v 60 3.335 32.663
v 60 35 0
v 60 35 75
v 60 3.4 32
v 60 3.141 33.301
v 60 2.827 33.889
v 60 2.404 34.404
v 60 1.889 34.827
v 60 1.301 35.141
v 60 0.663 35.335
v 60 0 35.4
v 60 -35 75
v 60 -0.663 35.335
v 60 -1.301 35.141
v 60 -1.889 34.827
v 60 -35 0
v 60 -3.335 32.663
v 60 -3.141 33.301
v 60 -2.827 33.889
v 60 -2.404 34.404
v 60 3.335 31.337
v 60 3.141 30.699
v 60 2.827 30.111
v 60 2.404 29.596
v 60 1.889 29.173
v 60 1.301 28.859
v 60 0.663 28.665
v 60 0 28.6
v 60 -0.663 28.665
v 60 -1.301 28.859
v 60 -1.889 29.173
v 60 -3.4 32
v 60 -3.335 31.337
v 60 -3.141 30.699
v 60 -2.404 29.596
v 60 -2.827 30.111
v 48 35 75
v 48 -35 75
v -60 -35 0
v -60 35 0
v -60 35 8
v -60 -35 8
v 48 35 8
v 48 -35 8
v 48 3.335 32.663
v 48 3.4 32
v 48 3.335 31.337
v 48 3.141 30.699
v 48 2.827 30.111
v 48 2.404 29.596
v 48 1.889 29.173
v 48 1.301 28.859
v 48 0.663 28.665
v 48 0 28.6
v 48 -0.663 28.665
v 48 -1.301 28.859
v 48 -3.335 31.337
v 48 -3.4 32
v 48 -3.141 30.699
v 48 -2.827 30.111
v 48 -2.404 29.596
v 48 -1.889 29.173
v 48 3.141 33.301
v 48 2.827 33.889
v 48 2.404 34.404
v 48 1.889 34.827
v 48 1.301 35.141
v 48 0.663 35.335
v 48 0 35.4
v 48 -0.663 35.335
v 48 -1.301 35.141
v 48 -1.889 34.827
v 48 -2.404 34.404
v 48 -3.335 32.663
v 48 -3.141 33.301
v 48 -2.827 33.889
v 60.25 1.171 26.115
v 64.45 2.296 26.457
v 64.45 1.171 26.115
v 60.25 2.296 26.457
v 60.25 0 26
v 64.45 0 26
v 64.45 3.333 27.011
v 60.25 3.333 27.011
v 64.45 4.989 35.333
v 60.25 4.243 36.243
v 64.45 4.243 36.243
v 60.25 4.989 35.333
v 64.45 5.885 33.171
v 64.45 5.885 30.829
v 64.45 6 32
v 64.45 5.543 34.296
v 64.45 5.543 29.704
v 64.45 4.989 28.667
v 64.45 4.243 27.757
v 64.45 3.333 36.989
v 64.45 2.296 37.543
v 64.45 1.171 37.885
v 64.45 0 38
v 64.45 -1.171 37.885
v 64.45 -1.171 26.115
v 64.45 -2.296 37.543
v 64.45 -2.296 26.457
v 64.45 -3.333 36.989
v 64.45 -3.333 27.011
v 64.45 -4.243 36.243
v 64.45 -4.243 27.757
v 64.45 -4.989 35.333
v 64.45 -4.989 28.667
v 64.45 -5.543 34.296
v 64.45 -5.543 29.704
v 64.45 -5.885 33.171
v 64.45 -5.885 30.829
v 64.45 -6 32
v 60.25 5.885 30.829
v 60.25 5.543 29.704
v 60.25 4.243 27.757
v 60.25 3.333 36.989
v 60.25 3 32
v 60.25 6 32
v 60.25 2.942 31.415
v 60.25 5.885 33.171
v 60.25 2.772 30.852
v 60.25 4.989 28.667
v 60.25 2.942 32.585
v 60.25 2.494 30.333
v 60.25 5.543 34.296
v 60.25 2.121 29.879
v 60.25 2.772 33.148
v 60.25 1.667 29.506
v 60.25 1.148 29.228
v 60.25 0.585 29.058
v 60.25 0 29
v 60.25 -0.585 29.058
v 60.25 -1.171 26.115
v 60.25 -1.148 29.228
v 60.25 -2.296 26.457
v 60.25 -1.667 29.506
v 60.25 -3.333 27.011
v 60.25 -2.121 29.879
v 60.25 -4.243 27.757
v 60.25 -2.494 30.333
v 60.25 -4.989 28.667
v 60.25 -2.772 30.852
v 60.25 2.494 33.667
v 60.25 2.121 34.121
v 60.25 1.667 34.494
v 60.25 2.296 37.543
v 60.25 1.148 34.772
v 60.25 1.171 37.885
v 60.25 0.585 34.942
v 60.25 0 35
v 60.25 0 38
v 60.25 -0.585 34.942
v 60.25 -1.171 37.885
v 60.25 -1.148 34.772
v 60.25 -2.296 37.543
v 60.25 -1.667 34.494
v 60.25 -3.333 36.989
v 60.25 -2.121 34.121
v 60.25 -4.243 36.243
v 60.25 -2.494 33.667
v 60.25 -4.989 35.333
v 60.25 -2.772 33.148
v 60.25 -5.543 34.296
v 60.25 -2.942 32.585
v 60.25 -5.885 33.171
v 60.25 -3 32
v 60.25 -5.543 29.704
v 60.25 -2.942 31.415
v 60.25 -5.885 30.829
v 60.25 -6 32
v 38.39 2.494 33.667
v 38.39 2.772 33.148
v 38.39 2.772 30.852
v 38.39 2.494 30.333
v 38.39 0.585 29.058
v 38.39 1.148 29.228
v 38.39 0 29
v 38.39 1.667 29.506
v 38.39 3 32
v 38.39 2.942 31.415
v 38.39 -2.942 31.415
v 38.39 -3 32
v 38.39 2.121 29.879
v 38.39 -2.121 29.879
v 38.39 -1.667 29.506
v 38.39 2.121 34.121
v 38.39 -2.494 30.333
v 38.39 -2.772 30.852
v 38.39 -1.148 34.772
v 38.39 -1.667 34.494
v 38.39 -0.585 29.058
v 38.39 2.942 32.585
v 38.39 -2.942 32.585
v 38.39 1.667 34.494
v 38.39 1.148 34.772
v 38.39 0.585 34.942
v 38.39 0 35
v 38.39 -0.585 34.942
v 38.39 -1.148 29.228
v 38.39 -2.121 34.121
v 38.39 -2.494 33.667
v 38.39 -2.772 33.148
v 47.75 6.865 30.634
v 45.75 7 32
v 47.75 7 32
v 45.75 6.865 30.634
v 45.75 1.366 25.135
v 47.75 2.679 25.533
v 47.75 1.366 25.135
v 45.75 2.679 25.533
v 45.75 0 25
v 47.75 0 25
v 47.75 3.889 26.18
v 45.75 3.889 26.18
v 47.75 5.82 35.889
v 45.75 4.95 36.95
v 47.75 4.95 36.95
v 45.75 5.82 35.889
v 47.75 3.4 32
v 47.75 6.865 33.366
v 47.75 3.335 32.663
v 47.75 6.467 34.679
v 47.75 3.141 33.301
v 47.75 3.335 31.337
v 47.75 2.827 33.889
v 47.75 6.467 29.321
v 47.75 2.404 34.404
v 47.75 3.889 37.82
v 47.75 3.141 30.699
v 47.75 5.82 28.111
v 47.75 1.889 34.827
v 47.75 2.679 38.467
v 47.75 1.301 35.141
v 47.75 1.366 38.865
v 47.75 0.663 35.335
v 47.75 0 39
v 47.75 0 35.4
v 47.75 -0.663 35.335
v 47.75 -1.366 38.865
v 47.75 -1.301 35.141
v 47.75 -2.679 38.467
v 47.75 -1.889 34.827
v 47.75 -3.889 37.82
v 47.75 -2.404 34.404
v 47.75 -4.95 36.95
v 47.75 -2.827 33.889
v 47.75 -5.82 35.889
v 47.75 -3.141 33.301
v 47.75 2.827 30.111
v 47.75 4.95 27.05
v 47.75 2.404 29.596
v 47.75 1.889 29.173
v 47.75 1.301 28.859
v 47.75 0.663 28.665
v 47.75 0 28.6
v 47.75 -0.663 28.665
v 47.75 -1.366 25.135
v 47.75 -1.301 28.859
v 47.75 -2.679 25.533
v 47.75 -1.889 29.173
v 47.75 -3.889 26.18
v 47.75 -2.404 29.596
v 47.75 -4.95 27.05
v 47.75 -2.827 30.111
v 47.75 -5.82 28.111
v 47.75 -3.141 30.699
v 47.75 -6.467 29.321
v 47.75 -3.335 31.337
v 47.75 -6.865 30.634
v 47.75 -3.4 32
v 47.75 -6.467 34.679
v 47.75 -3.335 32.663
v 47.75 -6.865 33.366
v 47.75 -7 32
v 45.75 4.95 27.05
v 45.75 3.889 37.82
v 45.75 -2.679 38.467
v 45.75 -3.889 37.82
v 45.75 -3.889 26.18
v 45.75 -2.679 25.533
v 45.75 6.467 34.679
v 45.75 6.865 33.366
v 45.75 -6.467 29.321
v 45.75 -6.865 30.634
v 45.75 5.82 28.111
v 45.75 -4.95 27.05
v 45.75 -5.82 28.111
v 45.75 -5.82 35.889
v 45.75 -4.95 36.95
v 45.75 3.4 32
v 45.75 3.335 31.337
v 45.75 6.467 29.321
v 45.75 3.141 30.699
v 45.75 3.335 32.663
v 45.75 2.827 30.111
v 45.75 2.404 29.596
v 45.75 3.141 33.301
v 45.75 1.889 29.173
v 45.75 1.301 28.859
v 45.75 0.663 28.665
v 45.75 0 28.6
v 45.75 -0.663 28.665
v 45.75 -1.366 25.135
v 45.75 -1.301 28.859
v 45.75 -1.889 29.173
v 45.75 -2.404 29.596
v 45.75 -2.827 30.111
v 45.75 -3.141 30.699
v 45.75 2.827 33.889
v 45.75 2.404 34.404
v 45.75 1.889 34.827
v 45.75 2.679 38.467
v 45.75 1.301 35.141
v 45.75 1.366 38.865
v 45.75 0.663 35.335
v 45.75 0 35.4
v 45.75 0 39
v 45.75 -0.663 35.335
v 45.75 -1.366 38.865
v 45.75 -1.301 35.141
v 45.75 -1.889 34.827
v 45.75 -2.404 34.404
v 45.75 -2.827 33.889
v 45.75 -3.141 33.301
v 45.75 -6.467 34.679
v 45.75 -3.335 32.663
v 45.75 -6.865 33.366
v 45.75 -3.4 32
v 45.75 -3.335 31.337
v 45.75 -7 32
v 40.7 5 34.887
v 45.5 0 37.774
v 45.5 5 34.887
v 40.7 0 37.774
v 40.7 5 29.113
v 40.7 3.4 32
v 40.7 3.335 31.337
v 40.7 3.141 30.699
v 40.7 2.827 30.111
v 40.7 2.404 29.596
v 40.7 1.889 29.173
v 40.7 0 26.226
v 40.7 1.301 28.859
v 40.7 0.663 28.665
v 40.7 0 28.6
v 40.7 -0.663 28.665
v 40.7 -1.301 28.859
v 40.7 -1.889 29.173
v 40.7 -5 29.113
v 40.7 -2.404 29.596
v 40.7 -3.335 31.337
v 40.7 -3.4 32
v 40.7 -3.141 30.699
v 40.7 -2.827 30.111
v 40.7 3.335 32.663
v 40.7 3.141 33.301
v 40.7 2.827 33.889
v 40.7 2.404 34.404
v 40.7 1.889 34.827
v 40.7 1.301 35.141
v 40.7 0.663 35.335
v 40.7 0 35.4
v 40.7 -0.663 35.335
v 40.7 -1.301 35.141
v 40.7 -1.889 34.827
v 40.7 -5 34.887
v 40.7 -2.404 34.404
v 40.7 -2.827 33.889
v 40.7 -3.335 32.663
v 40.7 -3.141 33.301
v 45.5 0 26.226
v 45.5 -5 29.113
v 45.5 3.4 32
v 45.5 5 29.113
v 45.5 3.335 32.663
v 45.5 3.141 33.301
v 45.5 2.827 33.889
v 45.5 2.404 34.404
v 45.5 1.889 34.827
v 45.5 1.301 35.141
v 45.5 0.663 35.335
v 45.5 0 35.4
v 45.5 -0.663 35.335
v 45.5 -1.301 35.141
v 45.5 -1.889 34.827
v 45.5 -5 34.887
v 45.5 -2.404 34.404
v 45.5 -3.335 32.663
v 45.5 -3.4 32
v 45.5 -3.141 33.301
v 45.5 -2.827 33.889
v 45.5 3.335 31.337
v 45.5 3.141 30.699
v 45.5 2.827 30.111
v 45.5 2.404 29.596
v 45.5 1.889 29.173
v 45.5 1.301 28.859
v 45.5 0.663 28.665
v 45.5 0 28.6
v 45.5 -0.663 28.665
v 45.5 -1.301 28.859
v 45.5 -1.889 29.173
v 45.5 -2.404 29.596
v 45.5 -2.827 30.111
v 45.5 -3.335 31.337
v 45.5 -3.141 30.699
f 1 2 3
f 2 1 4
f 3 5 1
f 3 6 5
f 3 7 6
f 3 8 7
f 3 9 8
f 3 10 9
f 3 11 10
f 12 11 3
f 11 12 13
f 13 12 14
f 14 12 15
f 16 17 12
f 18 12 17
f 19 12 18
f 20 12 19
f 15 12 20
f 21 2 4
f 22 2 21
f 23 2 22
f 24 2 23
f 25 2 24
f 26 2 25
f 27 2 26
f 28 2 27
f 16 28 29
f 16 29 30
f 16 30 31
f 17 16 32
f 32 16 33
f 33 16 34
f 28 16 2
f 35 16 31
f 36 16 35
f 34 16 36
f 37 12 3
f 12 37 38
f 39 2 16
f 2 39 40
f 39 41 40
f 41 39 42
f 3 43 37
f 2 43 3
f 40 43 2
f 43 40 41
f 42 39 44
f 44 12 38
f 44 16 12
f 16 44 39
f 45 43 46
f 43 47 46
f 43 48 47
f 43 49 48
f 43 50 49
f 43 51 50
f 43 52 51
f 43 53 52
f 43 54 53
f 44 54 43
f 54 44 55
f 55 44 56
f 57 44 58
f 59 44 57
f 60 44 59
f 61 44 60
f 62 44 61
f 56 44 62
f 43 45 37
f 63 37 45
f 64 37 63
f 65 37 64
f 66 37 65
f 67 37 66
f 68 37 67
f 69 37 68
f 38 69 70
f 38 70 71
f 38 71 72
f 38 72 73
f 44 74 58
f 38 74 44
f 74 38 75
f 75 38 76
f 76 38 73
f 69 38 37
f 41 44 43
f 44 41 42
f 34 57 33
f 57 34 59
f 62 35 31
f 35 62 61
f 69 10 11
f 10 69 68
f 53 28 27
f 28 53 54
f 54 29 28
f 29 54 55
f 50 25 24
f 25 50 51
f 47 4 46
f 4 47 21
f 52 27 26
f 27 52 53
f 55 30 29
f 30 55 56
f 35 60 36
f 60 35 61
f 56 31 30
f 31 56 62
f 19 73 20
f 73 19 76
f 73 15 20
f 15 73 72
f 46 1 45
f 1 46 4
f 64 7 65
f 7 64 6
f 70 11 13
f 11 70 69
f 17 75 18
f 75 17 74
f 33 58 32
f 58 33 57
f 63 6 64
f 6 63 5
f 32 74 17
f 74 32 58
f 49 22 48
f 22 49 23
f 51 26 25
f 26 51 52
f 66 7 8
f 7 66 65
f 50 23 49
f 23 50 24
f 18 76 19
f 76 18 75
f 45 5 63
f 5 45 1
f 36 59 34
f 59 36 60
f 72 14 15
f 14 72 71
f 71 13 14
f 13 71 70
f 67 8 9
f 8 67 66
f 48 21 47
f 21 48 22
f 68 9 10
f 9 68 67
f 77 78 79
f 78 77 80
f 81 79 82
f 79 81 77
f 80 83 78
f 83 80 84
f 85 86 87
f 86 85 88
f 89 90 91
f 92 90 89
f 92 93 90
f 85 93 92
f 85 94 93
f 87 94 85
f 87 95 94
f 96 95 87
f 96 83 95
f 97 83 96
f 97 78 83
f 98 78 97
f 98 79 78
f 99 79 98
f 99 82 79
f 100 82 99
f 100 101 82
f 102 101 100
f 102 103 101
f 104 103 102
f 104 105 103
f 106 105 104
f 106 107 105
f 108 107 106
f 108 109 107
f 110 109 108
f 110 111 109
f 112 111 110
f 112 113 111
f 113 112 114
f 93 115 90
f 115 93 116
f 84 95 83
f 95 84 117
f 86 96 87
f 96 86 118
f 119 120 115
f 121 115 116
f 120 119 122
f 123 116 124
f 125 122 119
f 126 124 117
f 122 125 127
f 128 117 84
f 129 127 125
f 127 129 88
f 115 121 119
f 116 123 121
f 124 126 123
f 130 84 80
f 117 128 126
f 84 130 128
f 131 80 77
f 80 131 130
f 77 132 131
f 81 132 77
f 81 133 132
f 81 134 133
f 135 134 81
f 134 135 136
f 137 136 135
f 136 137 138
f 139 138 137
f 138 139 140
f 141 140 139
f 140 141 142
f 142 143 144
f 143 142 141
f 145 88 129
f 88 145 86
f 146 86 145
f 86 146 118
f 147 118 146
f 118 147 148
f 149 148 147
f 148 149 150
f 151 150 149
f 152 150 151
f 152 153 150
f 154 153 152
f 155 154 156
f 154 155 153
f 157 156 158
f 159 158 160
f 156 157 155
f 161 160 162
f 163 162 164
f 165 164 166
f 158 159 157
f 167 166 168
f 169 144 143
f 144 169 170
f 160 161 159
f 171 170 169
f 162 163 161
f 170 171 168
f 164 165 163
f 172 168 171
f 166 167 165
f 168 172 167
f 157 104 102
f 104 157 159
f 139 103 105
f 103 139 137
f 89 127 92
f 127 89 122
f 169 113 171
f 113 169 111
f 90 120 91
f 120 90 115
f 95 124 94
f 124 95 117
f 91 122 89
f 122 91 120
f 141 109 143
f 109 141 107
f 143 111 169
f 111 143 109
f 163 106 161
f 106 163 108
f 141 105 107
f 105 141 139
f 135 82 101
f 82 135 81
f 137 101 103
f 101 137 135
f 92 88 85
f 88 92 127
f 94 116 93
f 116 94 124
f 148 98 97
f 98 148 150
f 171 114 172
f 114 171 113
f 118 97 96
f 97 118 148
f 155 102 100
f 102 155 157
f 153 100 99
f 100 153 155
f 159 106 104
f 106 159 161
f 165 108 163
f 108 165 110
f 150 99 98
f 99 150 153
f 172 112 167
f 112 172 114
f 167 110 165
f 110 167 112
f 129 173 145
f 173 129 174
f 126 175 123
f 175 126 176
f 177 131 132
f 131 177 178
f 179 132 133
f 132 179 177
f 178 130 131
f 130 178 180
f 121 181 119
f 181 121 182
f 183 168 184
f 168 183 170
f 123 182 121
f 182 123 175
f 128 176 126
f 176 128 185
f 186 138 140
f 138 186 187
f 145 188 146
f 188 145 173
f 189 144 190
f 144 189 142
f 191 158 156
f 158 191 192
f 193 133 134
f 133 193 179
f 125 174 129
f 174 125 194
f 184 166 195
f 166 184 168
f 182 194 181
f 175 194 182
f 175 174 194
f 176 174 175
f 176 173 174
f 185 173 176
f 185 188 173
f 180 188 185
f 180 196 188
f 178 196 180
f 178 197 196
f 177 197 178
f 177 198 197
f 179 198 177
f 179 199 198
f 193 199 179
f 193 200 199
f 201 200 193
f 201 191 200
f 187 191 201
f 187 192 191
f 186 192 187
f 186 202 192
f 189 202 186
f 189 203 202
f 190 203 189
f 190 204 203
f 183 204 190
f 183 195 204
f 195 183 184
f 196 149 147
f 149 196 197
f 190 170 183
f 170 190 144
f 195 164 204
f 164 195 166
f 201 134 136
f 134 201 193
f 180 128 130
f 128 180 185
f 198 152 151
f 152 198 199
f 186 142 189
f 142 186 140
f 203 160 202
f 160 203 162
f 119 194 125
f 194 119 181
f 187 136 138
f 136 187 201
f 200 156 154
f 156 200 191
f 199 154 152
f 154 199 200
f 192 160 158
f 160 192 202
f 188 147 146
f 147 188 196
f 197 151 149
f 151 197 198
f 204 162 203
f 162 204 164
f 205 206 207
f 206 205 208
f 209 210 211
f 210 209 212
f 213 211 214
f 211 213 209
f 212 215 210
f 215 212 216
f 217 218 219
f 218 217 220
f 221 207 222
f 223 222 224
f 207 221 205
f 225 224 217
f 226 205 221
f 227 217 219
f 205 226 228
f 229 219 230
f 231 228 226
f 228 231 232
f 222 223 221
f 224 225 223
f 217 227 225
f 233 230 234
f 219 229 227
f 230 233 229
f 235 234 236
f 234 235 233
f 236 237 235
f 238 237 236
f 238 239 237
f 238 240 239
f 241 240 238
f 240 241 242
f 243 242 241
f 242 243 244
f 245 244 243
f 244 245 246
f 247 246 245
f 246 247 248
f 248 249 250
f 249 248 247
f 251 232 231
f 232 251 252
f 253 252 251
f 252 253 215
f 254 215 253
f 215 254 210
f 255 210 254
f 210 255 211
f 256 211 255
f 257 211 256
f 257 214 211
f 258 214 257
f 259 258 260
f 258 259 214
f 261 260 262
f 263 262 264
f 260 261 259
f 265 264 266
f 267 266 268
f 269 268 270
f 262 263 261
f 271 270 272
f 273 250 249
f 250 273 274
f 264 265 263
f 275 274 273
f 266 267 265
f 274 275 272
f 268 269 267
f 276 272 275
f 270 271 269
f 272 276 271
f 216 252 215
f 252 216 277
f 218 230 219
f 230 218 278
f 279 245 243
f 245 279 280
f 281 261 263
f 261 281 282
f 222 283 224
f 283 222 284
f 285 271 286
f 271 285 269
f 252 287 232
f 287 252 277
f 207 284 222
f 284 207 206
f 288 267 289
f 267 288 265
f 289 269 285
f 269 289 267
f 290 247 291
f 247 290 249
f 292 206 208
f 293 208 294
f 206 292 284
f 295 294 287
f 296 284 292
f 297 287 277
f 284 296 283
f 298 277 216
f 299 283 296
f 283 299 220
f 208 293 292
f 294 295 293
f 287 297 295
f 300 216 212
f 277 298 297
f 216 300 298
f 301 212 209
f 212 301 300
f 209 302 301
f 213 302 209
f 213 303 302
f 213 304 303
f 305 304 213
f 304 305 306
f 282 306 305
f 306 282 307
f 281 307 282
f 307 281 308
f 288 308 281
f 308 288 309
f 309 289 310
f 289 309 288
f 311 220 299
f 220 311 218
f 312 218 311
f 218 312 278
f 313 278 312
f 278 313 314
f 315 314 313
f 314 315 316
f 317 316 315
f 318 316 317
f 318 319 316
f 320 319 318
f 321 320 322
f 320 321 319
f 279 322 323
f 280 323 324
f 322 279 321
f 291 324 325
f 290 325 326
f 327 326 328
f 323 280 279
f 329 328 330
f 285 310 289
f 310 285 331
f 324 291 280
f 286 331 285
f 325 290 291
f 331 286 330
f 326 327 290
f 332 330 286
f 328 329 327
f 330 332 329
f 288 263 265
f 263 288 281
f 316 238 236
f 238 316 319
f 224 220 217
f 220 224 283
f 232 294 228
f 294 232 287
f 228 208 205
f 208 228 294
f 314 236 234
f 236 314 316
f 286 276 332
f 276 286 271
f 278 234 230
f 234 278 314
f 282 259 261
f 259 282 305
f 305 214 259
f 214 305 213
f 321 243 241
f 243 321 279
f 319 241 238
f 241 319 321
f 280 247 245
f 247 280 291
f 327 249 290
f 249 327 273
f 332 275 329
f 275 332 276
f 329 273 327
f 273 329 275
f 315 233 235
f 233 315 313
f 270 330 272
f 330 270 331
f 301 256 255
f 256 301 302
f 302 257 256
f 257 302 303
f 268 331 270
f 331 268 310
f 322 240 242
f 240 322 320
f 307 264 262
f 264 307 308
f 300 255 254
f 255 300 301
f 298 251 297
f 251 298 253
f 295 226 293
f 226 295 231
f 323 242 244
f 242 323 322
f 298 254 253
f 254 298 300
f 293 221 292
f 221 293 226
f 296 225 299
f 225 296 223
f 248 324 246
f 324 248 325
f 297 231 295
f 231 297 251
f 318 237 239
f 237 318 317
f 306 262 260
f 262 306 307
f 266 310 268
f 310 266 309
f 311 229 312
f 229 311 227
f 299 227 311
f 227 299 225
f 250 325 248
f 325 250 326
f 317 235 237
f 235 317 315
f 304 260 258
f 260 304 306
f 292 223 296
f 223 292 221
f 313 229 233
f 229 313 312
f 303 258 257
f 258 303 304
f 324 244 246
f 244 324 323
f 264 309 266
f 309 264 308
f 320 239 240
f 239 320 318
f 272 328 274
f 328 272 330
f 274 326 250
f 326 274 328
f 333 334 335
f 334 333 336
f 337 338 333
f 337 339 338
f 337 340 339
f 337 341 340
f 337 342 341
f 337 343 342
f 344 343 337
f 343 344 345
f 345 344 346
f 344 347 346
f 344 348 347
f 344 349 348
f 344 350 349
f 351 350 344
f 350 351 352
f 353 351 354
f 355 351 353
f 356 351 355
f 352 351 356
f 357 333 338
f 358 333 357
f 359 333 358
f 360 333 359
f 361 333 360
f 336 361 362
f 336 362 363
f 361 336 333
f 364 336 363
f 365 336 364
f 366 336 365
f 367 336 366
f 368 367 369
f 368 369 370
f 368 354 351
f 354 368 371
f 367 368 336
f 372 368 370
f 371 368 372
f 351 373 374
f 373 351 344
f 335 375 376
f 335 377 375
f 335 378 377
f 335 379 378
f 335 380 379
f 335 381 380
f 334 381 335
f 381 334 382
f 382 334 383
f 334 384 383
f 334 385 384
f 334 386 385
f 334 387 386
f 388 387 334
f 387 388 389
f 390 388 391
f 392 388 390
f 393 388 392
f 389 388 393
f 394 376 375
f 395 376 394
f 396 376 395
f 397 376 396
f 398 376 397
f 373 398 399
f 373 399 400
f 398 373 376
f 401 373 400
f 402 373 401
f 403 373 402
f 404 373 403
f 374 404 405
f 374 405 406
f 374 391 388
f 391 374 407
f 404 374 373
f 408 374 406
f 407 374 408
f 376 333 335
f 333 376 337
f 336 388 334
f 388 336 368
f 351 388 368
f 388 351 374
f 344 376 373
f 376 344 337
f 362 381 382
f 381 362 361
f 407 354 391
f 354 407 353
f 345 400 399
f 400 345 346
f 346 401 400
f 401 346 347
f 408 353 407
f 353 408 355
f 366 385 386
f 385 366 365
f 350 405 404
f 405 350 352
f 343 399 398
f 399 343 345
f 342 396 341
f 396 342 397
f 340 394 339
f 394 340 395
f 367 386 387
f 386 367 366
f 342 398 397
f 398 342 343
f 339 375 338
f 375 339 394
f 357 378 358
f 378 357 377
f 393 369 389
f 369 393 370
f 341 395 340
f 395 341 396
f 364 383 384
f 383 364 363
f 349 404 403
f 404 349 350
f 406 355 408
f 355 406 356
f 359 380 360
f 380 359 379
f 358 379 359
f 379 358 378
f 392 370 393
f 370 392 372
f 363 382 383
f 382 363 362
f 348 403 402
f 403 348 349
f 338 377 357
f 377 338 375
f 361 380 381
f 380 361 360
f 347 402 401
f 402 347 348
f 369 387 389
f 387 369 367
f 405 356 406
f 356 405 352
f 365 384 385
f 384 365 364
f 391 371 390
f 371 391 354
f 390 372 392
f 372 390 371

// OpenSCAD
$fn = 32;

// ------------------------------------------------------------------------
// Bolted bracket: 120 x 70 mm bracket with 1 bolt joints
// Every part is its own module, assembly() places them once.
// ------------------------------------------------------------------------

// --- part 1 ---
module bracket() {
  difference() {
    translate([-60, -35, 0]) cube([120, 70, 75]);
    translate([-61, -36, 8]) cube([109, 72, 68]);
    translate([54, 0, 32]) rotate([0, 90, 0]) cylinder(h = 14, d = 6.8, center = true);
  }
}

// --- part 2 ---
module bolt() {
  cylinder(h = 4.2, d = 12);
  translate([0, 0, -21.86]) cylinder(h = 21.86, d = 6);
}

// --- part 3 ---
module washer() {
  difference() {
      translate([0, 0, 0]) cylinder(h = 2, d = 14);
      translate([0, 0, -1]) cylinder(h = 4, d = 6.8);
    }
}

// --- part 4 ---
module nut() {
  difference() {
    linear_extrude(height = 4.8) polygon(points = [[5.774, 0], [2.887, 5], [-2.887, 5], [-5.774, 0], [-2.887, -5], [2.887, -5]]);
    translate([0, 0, -1]) cylinder(h = 6.8, d = 6.8);
  }
}

// --- assembly ---
module assembly() {
  translate([0, 0, 0]) rotate([0, 0, 0]) bracket();
  translate([60.25, 0, 32]) rotate([0, 90, 0]) bolt();
  translate([45.75, 0, 32]) rotate([0, 90, 0]) washer();
  translate([40.7, 0, 32]) rotate([0, 90, 0]) nut();
}

assembly();
